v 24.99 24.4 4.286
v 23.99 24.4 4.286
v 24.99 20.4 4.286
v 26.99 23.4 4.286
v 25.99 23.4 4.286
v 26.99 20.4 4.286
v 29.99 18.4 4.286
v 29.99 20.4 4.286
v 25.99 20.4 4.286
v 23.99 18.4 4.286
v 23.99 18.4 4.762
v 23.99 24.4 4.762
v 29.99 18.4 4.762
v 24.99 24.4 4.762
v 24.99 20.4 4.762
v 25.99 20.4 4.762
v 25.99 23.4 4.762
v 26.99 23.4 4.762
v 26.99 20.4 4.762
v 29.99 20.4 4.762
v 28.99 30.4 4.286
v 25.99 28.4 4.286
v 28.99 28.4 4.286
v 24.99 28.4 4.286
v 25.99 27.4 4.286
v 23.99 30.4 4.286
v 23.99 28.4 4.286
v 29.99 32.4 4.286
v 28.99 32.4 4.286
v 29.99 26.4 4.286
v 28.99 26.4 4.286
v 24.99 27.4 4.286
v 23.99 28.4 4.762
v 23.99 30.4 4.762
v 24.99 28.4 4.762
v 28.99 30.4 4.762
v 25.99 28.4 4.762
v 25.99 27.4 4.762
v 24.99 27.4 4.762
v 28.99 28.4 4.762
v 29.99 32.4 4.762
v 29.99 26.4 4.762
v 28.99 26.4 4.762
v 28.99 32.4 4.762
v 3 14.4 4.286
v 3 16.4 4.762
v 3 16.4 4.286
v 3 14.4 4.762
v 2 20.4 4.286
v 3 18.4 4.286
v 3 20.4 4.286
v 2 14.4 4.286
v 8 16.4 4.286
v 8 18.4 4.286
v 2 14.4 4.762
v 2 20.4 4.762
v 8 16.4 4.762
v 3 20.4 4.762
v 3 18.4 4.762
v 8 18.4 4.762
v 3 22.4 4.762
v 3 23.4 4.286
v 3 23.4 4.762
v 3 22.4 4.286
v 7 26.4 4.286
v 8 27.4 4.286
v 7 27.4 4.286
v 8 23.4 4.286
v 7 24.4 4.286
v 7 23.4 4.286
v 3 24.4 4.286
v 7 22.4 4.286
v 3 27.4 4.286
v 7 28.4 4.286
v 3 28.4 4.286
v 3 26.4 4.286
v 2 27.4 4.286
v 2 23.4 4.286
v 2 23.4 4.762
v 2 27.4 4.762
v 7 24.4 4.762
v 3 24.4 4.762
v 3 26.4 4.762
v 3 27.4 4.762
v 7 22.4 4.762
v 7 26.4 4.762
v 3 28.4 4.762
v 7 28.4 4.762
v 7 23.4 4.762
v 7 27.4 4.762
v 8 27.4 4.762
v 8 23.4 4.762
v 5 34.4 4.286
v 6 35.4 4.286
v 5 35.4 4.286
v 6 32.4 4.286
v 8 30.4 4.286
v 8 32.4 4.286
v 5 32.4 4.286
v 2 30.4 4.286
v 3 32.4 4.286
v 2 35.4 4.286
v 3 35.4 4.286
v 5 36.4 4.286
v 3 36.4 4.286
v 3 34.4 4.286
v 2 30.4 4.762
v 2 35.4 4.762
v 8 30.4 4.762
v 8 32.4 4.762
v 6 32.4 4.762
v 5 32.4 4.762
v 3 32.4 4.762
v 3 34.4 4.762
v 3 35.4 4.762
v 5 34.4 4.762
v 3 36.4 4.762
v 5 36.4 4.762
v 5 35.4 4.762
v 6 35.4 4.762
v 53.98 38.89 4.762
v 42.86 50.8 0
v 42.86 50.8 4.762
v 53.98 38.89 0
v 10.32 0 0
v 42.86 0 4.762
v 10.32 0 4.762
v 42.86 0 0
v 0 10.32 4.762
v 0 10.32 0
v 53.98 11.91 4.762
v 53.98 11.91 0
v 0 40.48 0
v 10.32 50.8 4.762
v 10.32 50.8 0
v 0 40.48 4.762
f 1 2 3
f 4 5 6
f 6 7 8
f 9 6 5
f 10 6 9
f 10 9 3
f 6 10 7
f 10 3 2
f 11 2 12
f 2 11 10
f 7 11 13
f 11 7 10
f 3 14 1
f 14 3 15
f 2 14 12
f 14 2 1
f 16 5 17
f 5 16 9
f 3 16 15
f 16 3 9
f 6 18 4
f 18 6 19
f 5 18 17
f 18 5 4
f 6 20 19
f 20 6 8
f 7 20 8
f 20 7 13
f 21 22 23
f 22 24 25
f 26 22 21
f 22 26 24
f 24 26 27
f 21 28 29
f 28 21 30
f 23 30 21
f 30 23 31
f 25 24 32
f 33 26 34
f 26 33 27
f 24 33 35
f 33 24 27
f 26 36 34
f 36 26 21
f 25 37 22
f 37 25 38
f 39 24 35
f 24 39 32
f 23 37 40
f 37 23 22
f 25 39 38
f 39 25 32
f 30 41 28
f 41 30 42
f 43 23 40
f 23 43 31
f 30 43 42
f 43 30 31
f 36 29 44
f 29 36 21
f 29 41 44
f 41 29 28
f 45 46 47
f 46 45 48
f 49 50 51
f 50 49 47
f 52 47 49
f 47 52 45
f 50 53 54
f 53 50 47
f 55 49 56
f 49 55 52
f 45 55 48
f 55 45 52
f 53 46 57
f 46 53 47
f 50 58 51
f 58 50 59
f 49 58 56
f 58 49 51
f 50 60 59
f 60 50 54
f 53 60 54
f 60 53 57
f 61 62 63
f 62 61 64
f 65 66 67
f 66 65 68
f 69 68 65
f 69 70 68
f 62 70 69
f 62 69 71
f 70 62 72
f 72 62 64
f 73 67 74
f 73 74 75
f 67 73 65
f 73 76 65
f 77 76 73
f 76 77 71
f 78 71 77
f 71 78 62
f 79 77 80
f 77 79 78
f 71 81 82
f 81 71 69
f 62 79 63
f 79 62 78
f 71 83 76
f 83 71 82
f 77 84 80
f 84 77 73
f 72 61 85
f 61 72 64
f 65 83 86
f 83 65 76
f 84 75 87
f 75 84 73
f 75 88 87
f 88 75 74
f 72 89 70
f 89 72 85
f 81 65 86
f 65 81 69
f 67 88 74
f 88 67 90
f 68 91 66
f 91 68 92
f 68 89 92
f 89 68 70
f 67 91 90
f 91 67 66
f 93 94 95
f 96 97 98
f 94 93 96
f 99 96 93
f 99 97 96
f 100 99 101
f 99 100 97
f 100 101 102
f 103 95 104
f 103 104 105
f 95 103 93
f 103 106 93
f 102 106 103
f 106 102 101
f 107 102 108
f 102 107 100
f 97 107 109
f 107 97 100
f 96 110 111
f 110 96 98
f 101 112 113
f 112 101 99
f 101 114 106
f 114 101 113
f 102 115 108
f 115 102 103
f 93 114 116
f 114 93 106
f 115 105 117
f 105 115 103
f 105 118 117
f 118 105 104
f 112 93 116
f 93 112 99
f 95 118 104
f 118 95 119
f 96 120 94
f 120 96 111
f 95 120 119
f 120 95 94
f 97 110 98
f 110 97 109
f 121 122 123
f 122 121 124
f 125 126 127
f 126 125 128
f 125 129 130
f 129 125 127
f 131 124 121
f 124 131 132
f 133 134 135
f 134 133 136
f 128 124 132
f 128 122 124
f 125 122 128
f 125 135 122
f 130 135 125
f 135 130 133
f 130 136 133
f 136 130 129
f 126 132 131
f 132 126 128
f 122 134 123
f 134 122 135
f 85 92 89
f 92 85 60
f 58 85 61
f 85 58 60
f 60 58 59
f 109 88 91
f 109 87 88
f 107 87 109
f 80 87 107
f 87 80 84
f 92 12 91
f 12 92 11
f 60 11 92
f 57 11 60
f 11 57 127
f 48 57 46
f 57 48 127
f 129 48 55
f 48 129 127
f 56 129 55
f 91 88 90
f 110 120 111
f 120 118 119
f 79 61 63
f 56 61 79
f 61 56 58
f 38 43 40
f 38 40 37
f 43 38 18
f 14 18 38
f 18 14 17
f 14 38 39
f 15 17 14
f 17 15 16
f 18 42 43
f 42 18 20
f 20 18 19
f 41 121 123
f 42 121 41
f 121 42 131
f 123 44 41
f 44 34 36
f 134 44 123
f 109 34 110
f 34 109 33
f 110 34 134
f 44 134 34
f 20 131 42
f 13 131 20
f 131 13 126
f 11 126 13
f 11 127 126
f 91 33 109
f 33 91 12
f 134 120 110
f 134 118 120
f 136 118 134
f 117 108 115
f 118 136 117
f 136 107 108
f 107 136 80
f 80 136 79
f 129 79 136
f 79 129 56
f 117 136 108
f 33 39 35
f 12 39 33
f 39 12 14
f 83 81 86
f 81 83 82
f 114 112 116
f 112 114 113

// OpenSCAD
// Former F1 for MiG-25 Model

// Copyright (C) 2014 Jeremy Bennett <jeremy@jeremybennett.com>

// Contributor: Jeremy Bennett <jeremy@jeremybennett.com>

// This file is licensed under the Creative Commons Attribution-ShareAlike 3.0
// Unported License. To view a copy of this license, visit
// http://creativecommons.org/licenses/by-sa/3.0/ or send a letter to Creative
// Commons, PO Box 1866, Mountain View, CA 94042, USA.

// 45678901234567890123456789012345678901234567890123456789012345678901234567890

use <MCAD/bitmap/bitmap.scad>


// Put the name at a location and height

// Text is along the Y axis, with the first char centered on the origin.  At
// scale 1 it has height 8mm.

// @param s   Scale factor. Default 1. Does not affect h
// @param t   Text to print
// @param tc  Number of chars to print
// @param h   Height of the piece
// @param a   Angle to rotate around Z
// @param x   x offset of text center
// @param y   y offset of text center
module text_imprint (s = 1, t, tcount, h, a, x, y) {
	translate (v = [x * s, y * s, h * 9 / 10])
		rotate (a = [0, 0, a])
			translate (v = [0, -4 * s * (tc - 1), 0])
				8bit_str (chars = t, char_count = tc, block_size = s,
				          height = h / 5);
}


// The basic flat polygon

// @param s  Scale factor. Default 1
module f1_flat (s = 1) {
	polygon (points = [ [10.32 * s,  0.00 * s],
	                    [ 0.00 * s, 10.32 * s],
	                    [ 0.00 * s, 40.48 * s],
	                    [10.32 * s, 50.80 * s],
	                    [42.86 * s, 50.80 * s],
	                    [53.98 * s, 38.89 * s],
	                    [53.98 * s, 11.91 * s],
	                    [42.86 * s,  0.00 * s] ]);
}


// Extrude and label the polygon

// @param h  Height of the piece.  Not affected by s
// @param s  Scale factor.  Default 1
module f1 (h, s = 1) {
	difference () {
		linear_extrude (height = h)
			f1_flat (s = s);
		text_imprint (s = s, t = ["F", "1"], tc = 2, h = h, a = 0,
		              x = 53.98 / 2, y = 50.80 / 2);
		text_imprint (s = s, t = ["T", "O", "P"], tc = 3, h = h, a = 0,
		              x = 5, y = 50.80 / 2);
	}
}


// 3/16" thick former
f1 (h = 25.4 * 3 / 16, s = 1);
